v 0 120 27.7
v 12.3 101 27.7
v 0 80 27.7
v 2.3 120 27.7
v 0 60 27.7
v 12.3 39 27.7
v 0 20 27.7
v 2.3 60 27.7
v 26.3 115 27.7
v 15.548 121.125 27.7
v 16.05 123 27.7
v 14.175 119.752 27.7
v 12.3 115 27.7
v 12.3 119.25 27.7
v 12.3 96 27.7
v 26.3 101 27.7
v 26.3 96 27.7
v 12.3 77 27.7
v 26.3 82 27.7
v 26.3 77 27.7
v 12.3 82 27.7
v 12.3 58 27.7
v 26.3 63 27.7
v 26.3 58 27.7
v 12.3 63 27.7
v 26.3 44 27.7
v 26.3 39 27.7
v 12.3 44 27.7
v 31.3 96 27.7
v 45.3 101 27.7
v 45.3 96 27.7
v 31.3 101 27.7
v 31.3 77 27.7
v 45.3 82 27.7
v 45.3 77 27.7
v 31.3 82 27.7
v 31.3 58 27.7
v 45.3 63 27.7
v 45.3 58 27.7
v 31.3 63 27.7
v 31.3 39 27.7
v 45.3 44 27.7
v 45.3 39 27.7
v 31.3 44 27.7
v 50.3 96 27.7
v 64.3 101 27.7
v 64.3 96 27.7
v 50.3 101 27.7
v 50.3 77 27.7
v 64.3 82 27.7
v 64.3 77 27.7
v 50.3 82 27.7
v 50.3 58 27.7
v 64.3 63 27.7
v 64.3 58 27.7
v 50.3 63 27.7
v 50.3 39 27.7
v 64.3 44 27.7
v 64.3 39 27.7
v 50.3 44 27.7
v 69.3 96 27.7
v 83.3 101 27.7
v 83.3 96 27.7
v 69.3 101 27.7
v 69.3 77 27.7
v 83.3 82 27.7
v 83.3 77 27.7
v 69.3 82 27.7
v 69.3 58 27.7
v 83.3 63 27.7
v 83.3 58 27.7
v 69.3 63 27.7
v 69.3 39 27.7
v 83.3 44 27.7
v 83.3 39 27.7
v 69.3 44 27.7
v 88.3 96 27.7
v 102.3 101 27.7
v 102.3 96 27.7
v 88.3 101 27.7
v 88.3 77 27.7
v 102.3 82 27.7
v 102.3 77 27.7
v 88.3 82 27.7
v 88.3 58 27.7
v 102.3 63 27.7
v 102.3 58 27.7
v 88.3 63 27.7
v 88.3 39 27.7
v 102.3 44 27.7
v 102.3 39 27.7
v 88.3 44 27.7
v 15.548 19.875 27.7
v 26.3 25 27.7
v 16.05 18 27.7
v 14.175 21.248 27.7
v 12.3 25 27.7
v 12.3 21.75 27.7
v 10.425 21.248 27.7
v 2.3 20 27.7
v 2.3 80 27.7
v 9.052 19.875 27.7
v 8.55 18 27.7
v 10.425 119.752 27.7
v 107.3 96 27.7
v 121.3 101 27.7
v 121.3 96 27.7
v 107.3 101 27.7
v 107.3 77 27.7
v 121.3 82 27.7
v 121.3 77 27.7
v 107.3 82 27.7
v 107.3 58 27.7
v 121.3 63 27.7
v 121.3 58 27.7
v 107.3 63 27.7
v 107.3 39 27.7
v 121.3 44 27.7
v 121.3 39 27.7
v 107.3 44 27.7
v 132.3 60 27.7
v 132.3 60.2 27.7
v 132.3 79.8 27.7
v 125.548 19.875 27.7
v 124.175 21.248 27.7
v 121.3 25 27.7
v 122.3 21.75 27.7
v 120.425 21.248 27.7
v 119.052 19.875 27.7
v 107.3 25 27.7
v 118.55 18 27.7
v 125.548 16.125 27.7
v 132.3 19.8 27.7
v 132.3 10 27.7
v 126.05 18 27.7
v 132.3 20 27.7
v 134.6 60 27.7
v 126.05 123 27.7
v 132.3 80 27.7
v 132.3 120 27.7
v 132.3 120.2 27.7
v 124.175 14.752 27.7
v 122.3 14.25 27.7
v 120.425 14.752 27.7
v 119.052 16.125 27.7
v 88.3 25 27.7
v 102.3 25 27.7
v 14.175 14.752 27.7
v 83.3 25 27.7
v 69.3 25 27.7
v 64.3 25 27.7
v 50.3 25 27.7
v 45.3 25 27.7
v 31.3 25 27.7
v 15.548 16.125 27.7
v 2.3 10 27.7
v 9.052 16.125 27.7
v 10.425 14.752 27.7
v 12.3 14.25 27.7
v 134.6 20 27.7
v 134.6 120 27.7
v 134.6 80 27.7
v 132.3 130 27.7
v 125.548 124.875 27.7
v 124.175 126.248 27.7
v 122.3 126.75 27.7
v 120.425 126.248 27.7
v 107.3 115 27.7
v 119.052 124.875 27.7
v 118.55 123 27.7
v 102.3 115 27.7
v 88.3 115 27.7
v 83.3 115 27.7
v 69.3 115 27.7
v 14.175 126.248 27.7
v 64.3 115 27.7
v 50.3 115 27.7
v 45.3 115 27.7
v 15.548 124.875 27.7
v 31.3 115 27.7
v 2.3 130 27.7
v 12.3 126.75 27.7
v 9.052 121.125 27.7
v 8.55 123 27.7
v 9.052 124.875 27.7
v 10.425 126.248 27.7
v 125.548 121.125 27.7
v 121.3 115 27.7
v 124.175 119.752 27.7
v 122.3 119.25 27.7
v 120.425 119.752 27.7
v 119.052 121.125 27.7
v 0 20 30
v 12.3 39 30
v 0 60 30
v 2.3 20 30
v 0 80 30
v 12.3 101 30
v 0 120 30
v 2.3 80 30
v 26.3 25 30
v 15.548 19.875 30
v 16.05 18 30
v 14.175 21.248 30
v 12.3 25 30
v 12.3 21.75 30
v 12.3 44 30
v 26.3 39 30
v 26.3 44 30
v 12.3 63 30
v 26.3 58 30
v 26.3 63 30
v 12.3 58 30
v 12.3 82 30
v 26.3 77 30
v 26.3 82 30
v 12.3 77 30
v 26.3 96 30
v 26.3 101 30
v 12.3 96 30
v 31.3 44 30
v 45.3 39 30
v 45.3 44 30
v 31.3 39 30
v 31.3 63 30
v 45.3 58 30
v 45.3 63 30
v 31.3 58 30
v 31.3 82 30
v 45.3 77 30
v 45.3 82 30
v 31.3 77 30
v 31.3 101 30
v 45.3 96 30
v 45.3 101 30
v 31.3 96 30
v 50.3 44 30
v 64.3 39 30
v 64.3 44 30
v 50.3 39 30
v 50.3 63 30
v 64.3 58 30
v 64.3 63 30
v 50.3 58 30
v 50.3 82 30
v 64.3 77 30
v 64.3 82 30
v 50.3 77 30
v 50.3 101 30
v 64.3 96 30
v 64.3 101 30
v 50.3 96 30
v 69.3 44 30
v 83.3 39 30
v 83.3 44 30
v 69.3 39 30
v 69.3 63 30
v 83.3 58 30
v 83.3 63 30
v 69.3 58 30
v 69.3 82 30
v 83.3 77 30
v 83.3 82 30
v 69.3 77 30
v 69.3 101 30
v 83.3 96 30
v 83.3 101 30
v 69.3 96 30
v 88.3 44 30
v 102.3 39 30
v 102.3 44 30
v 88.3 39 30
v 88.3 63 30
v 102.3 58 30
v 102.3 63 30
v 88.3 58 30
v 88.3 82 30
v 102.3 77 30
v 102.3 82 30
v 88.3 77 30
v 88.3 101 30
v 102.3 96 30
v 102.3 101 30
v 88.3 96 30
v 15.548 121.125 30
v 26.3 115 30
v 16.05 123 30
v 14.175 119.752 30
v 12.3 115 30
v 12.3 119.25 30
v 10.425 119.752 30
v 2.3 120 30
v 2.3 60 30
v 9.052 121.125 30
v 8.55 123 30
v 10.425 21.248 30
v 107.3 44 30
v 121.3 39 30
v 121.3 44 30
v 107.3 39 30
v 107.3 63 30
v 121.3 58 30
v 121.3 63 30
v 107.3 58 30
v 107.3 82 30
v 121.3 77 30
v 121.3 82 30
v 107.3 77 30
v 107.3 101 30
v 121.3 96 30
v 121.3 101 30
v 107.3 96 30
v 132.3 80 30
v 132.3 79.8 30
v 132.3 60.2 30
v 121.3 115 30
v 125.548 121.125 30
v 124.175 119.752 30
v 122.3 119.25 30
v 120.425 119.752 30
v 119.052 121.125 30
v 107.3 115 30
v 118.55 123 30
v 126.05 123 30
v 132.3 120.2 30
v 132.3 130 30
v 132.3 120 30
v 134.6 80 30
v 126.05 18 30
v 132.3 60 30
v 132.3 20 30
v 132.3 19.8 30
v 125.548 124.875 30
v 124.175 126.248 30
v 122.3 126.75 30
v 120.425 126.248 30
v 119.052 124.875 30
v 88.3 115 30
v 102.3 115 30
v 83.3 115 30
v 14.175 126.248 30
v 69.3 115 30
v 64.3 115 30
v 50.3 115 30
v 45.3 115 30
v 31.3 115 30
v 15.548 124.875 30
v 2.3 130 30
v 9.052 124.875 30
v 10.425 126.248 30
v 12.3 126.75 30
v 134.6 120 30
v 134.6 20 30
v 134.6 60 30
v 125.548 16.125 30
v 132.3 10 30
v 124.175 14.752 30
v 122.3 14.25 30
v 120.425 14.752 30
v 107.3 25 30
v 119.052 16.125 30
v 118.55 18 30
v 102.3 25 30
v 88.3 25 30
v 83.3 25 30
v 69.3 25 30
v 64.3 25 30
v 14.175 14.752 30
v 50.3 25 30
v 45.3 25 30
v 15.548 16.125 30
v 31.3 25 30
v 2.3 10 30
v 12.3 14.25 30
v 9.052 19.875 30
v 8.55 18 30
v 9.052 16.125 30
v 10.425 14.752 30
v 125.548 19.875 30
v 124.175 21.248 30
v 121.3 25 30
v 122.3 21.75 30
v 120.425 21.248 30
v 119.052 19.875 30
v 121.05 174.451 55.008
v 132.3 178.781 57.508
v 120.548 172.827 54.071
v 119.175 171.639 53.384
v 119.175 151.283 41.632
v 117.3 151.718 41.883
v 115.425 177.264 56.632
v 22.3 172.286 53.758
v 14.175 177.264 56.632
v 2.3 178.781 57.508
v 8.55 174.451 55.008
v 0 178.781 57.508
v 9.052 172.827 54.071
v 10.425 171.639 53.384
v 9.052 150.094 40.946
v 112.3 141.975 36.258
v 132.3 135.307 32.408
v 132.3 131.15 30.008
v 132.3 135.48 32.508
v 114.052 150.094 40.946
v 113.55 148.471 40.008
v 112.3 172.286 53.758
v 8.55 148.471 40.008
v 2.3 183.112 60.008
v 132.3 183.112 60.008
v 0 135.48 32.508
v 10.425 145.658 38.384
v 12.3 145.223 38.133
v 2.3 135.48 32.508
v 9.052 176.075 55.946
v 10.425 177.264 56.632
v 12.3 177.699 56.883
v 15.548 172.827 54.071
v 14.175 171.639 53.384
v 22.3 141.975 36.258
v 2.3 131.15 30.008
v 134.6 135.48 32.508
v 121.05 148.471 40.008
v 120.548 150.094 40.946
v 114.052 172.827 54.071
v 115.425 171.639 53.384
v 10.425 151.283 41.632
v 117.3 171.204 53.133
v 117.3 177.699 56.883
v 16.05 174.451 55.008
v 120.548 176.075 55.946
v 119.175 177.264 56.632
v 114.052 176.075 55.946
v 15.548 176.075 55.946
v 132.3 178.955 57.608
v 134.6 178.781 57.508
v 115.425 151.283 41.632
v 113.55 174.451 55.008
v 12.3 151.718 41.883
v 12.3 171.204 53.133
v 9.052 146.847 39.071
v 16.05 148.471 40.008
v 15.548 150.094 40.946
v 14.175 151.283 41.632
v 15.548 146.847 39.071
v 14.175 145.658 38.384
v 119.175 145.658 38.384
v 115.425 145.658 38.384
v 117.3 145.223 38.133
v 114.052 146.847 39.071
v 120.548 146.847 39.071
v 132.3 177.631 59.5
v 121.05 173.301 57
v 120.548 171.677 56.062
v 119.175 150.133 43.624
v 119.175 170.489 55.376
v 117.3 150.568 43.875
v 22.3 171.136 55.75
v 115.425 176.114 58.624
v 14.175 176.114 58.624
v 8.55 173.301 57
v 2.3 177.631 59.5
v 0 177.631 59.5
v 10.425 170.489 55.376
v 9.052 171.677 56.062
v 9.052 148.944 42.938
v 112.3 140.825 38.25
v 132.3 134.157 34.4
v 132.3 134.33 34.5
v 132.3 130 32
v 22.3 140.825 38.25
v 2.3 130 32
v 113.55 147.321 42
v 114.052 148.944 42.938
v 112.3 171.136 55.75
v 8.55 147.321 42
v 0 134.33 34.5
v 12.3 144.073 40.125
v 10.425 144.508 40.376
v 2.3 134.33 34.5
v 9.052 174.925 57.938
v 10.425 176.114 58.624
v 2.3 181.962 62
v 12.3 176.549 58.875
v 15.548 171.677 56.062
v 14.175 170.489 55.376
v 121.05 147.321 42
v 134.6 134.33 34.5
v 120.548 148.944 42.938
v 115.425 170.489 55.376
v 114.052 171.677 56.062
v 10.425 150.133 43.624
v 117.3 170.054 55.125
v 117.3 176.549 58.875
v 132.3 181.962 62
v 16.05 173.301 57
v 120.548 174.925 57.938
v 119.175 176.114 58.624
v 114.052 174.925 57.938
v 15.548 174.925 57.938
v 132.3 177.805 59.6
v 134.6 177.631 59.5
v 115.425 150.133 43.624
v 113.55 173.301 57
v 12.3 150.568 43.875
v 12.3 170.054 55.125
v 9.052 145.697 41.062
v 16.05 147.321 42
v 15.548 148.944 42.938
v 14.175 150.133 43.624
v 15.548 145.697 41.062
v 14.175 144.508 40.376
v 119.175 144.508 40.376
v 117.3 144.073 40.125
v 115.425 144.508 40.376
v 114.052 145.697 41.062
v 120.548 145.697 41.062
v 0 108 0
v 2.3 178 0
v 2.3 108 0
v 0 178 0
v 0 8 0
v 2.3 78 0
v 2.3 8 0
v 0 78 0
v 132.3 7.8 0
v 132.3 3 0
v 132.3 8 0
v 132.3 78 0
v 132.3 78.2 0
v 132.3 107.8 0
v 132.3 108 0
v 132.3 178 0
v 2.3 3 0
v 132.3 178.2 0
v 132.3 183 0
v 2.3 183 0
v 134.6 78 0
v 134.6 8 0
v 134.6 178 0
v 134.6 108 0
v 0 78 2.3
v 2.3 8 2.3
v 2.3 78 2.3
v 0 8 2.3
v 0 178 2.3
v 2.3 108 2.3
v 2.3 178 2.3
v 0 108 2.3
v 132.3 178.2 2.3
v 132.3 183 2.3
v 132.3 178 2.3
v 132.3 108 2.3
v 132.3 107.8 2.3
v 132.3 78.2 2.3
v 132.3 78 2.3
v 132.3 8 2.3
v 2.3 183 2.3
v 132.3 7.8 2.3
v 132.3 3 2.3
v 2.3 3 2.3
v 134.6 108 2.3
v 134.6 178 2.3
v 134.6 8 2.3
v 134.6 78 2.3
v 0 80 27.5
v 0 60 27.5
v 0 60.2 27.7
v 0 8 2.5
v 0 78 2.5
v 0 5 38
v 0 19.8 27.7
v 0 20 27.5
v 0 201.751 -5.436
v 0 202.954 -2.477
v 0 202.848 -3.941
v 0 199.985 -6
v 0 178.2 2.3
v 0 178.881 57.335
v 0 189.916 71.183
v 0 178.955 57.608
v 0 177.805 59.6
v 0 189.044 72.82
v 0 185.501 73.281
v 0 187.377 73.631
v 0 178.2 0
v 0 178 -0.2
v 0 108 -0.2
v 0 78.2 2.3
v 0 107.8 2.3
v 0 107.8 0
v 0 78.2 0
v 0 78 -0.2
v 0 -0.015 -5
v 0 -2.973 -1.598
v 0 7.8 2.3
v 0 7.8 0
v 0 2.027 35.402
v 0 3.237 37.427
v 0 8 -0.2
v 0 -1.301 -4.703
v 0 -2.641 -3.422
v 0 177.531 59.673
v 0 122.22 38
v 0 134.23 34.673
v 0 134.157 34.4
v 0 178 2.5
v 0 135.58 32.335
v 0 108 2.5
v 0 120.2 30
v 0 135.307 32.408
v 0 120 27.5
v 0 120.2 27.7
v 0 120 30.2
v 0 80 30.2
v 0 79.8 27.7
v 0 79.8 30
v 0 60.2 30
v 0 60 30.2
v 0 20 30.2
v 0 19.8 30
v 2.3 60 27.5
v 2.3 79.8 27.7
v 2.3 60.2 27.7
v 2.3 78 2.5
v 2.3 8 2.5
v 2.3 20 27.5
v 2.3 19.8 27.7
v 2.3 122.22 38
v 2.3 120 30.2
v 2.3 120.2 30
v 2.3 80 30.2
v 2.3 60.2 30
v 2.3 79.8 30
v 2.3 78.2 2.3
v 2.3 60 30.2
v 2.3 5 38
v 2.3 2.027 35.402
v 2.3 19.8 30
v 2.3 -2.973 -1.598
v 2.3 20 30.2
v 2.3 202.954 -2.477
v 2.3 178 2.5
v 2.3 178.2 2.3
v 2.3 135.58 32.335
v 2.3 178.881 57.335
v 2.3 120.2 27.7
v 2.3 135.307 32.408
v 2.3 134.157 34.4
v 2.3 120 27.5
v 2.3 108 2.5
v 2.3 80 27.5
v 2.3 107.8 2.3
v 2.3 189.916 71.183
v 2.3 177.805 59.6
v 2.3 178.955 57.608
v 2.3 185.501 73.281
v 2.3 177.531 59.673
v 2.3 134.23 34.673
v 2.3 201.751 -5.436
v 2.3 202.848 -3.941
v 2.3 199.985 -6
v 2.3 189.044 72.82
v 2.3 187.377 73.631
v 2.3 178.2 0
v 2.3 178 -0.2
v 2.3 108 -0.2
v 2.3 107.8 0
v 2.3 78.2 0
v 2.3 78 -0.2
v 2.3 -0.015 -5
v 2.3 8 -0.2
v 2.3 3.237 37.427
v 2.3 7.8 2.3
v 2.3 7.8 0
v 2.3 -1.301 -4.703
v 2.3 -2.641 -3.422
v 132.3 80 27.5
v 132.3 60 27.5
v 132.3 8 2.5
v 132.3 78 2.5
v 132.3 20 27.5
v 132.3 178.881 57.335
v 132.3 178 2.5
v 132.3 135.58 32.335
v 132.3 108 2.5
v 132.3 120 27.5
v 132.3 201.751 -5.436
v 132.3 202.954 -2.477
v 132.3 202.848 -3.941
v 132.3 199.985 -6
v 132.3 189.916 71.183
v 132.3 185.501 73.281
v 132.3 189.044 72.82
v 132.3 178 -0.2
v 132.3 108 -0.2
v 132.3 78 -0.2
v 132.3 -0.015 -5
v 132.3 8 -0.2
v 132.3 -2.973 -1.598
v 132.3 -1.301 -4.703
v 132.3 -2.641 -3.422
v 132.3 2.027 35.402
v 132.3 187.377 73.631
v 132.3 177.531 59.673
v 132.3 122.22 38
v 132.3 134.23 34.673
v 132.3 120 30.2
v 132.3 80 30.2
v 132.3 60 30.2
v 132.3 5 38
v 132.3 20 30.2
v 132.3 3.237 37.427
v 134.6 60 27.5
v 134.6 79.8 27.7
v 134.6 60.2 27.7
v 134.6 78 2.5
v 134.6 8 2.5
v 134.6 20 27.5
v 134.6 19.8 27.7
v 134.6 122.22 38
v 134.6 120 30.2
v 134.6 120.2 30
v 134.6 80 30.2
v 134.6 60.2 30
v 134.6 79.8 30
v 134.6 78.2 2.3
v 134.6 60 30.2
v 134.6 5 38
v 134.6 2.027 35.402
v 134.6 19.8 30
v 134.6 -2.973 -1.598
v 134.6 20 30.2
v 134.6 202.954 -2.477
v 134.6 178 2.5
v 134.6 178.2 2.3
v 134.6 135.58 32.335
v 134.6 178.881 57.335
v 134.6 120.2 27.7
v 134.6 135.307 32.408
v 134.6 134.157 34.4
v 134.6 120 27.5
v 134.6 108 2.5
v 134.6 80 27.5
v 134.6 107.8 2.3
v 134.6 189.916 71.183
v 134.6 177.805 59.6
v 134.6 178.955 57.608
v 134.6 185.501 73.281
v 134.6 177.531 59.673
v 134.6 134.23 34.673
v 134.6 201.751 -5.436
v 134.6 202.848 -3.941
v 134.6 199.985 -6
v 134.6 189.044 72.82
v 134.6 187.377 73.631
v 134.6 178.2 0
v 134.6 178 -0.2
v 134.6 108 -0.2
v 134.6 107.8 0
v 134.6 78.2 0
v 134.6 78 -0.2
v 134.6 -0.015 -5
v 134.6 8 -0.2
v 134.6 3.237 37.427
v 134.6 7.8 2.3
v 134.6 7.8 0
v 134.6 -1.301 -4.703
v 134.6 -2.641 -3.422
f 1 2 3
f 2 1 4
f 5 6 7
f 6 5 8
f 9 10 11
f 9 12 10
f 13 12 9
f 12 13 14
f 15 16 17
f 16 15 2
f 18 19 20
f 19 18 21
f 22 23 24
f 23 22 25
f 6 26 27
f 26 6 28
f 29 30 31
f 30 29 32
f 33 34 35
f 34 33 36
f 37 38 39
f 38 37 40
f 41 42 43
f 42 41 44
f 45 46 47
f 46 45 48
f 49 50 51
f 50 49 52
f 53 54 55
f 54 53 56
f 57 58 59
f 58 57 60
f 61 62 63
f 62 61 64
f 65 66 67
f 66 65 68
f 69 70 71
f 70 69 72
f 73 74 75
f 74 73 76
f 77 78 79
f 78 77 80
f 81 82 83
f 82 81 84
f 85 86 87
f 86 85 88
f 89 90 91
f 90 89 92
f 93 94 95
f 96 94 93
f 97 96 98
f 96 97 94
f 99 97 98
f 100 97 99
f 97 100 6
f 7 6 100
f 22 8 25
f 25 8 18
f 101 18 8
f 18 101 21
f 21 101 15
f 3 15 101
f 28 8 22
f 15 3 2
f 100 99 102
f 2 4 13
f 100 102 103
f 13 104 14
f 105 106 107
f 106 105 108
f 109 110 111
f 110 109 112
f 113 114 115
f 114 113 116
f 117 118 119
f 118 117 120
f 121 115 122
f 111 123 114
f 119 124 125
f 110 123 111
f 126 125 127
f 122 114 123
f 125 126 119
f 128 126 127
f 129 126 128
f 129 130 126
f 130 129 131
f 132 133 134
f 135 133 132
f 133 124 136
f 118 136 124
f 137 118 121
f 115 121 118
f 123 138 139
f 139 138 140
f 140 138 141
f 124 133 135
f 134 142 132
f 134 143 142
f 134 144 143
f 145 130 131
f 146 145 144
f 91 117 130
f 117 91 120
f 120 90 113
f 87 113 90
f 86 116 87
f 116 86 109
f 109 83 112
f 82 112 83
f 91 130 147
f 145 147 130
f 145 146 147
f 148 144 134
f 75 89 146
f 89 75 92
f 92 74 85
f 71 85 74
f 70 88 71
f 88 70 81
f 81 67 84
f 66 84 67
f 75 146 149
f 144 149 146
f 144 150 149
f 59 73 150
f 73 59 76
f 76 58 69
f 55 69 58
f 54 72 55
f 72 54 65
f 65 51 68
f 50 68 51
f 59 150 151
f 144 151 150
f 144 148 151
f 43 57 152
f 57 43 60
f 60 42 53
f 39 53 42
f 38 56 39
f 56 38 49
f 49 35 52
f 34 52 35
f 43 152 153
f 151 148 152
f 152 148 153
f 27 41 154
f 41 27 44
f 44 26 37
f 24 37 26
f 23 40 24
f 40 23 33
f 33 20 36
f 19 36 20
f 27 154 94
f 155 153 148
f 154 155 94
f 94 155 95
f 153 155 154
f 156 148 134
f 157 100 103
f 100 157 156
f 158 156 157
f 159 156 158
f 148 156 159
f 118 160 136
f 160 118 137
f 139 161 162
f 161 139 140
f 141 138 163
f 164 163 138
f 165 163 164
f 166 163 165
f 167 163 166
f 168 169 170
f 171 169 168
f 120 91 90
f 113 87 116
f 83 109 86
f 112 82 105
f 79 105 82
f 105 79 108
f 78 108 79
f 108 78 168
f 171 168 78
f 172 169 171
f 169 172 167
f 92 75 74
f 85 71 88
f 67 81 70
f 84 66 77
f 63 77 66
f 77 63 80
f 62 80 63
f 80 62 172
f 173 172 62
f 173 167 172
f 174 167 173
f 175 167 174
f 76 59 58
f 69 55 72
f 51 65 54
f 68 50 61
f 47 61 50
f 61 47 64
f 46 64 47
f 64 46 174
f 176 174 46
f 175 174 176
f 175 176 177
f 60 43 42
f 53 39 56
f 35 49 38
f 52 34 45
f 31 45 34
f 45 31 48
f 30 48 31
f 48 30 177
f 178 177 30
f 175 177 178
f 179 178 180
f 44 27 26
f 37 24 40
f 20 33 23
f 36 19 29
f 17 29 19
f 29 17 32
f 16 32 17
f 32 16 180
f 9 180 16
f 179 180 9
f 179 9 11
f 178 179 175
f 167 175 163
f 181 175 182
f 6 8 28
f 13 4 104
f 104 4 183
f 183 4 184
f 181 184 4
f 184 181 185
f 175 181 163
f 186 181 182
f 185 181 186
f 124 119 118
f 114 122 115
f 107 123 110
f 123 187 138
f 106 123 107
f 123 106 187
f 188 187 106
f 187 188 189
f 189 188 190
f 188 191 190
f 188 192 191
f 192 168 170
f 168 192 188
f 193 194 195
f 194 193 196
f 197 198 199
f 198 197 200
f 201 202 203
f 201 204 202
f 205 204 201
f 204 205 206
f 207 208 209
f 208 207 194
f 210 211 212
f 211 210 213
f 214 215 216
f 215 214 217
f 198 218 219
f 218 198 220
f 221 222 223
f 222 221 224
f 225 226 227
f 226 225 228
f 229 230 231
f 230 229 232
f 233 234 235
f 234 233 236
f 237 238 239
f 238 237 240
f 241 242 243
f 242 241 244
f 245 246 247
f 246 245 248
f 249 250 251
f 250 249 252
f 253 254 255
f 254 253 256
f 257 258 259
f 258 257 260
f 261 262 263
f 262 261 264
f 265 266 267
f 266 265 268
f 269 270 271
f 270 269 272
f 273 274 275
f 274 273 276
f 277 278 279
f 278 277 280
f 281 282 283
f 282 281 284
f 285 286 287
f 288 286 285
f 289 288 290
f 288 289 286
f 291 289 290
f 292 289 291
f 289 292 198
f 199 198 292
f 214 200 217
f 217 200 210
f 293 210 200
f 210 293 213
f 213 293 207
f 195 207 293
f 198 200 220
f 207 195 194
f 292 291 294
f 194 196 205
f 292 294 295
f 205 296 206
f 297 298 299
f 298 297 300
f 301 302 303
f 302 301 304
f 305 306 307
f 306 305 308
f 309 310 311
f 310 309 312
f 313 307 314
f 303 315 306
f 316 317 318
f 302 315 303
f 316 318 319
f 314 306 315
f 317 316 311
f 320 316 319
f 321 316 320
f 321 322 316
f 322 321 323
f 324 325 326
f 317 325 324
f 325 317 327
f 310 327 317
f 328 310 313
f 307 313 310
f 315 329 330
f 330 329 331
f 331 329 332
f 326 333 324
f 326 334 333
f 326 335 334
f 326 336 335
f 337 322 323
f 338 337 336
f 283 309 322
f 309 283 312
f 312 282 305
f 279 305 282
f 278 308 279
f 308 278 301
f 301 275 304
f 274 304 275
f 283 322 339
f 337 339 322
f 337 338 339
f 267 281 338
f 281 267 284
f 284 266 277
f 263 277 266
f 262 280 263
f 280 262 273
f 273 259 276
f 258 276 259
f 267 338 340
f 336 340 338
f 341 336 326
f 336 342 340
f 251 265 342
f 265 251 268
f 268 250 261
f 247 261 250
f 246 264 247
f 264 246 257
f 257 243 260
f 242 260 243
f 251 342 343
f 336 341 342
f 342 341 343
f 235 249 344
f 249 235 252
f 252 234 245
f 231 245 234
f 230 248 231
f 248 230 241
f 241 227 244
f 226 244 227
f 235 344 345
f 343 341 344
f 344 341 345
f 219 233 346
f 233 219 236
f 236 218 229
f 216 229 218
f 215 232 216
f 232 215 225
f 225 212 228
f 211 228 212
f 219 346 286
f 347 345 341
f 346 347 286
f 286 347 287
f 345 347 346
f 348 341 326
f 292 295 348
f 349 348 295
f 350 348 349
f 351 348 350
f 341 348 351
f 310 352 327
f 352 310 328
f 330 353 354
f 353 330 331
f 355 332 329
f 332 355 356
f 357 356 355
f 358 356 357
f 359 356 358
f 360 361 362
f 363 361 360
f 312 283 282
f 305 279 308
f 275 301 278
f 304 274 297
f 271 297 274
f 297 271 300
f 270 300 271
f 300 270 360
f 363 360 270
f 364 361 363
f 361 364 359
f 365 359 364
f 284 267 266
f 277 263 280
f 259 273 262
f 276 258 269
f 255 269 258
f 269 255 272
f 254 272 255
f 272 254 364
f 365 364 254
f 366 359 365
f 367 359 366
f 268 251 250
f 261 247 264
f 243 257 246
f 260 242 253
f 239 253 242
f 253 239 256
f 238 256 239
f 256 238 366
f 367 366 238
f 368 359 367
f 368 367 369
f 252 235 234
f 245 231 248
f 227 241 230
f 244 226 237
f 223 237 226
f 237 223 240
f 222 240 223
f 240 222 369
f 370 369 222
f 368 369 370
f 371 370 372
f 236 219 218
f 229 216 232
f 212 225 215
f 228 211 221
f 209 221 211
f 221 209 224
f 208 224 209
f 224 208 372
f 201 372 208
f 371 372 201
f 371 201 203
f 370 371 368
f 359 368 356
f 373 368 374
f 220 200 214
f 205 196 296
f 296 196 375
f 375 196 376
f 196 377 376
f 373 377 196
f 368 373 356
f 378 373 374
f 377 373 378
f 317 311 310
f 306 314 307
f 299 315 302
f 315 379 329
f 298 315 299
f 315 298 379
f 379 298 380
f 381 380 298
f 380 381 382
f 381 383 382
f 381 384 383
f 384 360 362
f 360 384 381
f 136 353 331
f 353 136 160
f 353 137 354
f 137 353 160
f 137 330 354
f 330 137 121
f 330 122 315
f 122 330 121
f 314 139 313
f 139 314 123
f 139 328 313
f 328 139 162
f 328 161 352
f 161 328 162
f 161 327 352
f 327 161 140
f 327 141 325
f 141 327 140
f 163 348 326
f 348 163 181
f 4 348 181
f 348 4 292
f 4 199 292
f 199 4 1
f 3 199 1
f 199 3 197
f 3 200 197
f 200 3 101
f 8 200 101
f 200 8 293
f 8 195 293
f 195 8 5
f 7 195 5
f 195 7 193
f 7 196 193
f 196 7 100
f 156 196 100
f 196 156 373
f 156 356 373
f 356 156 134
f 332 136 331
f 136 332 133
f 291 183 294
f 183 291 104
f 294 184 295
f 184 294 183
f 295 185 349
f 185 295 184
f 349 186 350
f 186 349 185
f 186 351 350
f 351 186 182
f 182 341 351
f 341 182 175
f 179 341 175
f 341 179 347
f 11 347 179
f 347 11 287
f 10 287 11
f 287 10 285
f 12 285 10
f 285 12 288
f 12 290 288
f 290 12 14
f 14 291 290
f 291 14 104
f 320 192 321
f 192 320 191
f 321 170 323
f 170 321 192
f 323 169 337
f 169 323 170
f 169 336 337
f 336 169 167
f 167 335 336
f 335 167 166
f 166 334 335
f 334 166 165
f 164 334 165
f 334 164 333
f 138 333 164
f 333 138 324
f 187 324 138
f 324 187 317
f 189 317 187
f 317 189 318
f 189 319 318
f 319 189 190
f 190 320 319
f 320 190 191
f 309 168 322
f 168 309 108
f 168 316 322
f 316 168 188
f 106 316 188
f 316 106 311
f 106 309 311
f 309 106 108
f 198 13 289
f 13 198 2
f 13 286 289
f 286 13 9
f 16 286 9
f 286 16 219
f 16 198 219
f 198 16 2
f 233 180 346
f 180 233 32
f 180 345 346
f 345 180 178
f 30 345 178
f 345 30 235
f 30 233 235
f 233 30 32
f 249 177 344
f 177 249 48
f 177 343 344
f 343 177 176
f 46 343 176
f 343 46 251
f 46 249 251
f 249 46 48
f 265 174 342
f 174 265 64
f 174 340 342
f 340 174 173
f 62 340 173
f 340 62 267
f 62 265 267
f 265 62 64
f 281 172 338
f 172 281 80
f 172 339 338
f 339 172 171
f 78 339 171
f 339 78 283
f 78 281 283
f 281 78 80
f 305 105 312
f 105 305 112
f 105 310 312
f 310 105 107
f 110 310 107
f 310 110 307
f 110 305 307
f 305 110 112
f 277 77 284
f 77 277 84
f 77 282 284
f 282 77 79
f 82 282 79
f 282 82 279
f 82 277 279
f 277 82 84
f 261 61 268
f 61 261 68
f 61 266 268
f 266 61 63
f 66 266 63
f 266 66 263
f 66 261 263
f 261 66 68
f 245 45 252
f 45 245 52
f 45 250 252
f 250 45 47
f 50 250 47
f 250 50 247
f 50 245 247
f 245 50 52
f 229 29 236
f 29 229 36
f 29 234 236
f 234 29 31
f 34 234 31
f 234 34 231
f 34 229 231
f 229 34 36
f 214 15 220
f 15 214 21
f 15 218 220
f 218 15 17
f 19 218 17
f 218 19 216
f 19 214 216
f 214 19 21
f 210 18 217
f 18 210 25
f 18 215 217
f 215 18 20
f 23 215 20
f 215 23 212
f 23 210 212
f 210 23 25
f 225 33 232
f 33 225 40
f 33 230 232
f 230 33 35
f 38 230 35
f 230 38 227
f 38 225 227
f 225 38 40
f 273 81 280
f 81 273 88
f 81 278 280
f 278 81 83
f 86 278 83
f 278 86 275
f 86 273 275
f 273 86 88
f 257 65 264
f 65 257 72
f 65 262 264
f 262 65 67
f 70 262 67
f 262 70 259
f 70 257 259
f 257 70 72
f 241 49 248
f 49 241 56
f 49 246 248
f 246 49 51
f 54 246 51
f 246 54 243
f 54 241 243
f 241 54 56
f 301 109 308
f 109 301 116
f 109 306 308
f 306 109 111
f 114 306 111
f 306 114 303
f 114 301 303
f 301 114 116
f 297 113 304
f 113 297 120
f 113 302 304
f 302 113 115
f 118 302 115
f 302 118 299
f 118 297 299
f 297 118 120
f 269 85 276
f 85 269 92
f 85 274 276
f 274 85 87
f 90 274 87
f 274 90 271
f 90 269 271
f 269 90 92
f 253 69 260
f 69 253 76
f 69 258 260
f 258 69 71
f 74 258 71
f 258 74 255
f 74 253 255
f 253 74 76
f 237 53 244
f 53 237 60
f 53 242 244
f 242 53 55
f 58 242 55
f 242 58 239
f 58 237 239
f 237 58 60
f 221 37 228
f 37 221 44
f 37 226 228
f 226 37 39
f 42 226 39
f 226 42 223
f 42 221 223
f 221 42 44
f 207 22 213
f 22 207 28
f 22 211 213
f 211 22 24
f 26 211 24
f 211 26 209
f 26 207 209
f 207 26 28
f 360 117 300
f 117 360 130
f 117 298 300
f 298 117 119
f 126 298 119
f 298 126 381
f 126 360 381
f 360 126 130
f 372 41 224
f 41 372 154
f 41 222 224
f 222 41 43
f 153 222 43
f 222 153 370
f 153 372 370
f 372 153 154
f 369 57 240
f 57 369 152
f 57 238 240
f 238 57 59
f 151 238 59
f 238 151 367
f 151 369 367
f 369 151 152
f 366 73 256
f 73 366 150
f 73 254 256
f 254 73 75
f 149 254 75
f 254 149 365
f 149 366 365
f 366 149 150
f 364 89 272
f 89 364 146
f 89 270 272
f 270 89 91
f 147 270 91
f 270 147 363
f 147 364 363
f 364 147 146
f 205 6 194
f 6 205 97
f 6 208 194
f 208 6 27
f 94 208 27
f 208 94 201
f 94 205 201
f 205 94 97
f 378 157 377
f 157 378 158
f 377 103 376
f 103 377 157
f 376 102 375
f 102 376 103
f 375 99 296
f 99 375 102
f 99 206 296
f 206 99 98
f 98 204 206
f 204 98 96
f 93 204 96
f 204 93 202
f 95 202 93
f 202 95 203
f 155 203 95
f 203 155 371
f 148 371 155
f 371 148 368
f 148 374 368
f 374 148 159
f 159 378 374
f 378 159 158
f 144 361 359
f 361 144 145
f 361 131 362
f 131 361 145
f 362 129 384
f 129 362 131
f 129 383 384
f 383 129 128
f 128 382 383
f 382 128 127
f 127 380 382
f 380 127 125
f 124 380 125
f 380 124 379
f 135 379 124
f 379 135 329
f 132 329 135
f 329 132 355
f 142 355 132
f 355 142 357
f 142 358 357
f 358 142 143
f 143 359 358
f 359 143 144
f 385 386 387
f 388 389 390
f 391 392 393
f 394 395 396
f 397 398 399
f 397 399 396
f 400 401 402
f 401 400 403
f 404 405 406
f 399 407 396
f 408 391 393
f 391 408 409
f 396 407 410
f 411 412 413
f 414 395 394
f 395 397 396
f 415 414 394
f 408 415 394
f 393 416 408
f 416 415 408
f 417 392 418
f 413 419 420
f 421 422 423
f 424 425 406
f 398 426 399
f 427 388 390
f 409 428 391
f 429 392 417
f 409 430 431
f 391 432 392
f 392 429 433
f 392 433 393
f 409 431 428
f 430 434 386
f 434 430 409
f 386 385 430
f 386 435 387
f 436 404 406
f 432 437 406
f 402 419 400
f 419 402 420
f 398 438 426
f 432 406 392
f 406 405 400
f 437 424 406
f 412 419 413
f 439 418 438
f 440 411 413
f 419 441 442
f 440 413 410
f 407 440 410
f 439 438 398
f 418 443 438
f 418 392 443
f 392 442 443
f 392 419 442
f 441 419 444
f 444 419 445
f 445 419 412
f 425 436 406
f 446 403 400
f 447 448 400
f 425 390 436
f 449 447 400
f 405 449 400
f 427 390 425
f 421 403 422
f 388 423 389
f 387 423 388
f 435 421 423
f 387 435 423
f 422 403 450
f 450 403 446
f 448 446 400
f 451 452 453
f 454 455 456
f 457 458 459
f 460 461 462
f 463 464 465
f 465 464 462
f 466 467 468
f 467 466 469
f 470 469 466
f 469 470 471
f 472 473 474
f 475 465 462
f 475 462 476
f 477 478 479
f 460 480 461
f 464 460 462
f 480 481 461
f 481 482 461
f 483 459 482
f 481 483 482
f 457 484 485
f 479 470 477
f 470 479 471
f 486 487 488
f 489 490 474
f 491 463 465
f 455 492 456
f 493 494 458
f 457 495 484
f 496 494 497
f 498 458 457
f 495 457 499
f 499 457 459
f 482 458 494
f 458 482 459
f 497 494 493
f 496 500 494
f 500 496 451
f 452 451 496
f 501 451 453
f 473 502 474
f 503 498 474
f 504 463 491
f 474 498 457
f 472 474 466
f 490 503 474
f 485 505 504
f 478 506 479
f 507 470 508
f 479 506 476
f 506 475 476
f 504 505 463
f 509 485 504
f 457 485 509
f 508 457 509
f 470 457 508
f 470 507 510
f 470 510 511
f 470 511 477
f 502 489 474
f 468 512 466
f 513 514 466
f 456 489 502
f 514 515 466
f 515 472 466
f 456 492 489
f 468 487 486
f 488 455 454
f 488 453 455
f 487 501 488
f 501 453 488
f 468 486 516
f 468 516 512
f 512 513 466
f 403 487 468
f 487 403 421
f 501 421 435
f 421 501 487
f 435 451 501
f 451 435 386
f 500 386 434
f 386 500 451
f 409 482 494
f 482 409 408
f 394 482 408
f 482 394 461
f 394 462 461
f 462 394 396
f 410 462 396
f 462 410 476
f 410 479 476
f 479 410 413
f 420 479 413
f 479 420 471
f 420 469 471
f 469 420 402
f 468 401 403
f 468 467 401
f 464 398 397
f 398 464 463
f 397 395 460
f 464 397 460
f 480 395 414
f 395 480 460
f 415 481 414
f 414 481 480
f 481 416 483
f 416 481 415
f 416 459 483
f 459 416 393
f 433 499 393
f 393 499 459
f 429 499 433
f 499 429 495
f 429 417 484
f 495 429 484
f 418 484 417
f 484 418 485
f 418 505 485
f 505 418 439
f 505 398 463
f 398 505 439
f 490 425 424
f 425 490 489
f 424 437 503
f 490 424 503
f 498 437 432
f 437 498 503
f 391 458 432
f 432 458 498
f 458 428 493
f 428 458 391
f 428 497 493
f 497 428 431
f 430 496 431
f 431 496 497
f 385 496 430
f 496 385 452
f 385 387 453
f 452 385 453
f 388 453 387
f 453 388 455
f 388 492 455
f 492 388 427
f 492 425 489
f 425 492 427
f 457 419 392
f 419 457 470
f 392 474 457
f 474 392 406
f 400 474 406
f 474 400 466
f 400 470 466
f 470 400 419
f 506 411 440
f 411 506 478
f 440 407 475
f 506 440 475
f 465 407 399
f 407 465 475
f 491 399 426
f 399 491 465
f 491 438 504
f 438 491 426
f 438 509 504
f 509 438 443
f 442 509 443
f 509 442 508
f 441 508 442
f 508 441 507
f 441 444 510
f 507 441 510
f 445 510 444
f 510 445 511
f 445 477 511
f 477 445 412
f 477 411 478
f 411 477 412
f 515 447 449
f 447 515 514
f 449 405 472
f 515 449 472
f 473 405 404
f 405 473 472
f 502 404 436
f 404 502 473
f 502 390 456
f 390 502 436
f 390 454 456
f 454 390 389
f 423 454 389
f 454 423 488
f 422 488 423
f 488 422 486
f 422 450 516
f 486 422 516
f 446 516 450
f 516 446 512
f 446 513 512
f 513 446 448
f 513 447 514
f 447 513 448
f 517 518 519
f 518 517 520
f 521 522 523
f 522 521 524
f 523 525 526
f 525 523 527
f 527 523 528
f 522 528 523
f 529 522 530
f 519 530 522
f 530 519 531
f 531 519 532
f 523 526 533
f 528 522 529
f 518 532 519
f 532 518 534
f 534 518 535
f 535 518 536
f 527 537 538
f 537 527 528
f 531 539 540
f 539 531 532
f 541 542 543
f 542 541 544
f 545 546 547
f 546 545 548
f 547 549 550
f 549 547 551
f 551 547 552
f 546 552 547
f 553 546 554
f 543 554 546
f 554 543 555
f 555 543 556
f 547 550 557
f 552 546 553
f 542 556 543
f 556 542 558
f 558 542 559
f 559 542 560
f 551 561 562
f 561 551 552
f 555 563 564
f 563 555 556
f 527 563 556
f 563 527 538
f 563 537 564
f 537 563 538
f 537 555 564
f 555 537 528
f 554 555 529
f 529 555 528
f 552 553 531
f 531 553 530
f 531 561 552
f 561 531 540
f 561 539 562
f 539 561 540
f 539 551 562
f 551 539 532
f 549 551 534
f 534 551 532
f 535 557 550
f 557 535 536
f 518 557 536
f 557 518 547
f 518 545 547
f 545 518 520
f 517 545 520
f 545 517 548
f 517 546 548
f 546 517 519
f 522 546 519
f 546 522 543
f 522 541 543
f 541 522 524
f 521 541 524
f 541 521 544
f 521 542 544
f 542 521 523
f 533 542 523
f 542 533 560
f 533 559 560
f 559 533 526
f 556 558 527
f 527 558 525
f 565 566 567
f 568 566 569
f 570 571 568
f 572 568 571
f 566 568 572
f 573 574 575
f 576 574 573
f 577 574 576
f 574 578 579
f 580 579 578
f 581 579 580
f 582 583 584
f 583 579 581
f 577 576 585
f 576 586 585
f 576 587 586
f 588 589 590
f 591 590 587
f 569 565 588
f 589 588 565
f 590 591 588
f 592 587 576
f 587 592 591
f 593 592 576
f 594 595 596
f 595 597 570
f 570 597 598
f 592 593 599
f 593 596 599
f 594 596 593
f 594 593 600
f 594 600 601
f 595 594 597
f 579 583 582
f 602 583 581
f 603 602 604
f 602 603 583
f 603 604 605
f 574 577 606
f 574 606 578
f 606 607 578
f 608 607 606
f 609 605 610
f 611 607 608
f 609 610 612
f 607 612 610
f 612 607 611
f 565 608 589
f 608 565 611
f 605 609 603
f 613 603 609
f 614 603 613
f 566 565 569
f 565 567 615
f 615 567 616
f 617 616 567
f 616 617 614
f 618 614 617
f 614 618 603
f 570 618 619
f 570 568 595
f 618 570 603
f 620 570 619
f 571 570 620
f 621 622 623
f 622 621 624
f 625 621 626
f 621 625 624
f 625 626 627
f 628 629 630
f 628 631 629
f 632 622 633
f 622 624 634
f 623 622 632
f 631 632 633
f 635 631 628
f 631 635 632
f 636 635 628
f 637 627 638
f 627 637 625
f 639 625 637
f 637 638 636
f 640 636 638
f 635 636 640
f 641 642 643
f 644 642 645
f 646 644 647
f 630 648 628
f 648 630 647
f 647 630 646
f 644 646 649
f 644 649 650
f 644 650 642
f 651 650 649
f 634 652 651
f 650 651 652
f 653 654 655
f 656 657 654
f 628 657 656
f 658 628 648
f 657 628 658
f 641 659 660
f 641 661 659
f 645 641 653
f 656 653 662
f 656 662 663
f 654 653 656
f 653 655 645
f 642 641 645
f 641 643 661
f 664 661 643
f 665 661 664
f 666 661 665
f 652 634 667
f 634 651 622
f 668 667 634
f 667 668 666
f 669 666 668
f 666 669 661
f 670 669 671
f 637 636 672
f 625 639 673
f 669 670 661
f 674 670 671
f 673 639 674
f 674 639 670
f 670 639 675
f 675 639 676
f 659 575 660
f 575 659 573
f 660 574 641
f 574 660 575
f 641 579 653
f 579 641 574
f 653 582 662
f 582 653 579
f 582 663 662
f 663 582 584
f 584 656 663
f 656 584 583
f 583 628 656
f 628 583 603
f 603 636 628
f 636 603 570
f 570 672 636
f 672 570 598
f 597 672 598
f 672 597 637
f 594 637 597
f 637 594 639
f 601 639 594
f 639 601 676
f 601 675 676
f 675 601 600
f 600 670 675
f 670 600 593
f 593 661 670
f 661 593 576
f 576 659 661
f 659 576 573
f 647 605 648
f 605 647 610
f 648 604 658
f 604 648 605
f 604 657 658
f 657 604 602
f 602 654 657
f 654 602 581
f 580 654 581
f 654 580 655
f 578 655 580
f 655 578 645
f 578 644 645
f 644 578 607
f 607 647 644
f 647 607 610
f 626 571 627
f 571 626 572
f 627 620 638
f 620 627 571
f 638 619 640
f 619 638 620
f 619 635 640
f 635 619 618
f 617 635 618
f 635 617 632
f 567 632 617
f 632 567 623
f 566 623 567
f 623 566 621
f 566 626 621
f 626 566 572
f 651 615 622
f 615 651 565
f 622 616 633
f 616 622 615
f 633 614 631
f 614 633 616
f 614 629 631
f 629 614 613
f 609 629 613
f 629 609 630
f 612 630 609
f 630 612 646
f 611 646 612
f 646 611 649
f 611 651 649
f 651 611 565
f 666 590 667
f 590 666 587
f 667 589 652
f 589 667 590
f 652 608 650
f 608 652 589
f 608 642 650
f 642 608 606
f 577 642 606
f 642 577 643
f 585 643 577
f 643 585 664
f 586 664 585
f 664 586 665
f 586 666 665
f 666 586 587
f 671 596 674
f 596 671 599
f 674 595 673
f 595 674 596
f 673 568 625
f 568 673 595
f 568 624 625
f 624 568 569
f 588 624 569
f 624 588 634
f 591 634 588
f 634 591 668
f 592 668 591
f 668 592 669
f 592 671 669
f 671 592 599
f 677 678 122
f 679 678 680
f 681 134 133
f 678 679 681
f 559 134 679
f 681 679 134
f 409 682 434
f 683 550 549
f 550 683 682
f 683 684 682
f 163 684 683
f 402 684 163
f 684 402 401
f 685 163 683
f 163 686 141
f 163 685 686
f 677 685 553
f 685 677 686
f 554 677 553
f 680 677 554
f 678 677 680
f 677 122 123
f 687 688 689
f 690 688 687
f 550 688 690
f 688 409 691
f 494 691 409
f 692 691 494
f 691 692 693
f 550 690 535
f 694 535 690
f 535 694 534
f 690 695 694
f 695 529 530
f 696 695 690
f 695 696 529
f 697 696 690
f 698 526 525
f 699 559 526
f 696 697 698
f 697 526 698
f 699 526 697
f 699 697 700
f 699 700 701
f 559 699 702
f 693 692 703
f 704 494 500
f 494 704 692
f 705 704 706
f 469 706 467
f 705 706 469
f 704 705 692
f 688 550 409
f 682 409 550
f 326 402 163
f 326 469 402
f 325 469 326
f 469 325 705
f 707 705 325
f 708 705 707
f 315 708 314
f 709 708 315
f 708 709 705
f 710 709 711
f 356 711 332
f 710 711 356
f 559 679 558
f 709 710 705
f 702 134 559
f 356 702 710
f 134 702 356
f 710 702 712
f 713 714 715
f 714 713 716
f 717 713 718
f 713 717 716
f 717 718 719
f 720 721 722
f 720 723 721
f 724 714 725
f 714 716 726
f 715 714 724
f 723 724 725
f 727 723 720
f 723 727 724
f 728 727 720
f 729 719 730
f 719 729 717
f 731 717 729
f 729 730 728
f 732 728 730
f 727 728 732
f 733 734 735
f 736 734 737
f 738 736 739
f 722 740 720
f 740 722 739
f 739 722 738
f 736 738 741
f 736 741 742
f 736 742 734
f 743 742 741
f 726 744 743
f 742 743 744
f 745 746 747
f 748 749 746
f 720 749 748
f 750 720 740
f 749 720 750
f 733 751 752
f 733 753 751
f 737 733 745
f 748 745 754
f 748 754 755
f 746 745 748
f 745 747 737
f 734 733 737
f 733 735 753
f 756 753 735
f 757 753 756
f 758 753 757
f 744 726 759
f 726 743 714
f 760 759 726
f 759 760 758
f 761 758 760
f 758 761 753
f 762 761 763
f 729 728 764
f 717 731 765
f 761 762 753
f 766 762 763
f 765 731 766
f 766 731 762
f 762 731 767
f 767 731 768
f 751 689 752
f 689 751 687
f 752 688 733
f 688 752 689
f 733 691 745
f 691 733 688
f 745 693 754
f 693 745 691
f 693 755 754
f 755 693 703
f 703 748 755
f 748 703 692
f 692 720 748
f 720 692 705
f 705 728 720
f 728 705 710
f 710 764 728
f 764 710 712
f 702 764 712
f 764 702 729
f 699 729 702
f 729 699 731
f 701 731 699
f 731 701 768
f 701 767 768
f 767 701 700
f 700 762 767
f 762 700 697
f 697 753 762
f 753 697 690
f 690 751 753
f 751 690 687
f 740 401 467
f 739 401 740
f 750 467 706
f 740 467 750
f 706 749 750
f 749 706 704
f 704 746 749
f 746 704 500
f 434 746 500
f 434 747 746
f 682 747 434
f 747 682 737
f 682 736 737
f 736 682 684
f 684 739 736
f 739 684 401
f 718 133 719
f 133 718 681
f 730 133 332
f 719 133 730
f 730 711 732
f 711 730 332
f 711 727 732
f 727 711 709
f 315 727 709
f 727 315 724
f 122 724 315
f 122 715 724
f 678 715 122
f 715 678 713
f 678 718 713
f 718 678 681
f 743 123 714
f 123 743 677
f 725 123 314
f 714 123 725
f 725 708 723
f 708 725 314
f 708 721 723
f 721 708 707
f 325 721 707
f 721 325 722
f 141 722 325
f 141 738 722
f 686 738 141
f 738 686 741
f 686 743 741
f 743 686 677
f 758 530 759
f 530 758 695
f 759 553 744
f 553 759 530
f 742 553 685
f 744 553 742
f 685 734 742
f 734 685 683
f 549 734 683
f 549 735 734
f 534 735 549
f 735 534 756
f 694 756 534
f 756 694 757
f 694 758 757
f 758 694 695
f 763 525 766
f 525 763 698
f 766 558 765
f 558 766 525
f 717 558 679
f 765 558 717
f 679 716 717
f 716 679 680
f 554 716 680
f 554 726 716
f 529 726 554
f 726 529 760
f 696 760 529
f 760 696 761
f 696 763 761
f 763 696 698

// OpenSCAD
overall_dimensions = [130, 200, 60];
stock_thickness = 2.3;
hole_diameter = 3.75;

front_inset = 10;
back_inset = 10;
base_inset = 3;

keypad_plate_height = 30;
display_plate_height = 32;
display_back_distance = 130;

side_allowance = 5;

tab_length = 40;
tab_depth = stock_thickness;
tab_tolerance = .2;

keypad_width = 130;
keypad_height = 115;

display_height = 60;
display_angle = 30;
display_dimensions = [90,35];

function display_top_coords() = [0,display_back_distance + cos(display_angle) * display_height,display_plate_height + sin(display_angle) * display_height];

module mounting_holes_2d(rows, columns, spacing) {
    for(row=[0:rows-1], col=[0:columns-1]) {
        translate([col * spacing.x, row * spacing.y])
            circle(hole_diameter);
    }
}

module tab2d(plate_width, length) {
    translate([plate_width/2,0])square([plate_width+2*tab_depth, length],center=true);
}

module keypad_plate() {
    key_rows = 5;
    key_cols = 6;

    key_width = 14;
    key_height = key_width;

    mounting_hole_spacing = [110, 105];

    module plate_frame(size) {
        square([size.x,size.y]);
        // two tabs on each side
        translate([size.x/2,90])square([size.x + 2*tab_depth, tab_length],center=true);
        translate([size.x/2,30])square([size.x + 2*tab_depth, tab_length],center=true);
    }

    module key_array(rows, columns, spacing) {
        for(row=[0:rows-1], col=[0:columns-1]) {
            translate([col * (key_width + spacing), row * (key_width + spacing),0])
                square([key_width, key_height]);
        }
    }

    difference() {
        plate_frame([keypad_width,120]);
        translate([10,15])key_array(key_rows,key_cols,5);
        translate([10,8])mounting_holes_2d(2, 2, mounting_hole_spacing);
    }
}

module display_plate(size) {
    module display_frame(size) {
        square(size);
        translate([0,size.y/2])tab2d(size.x, size.y - 10);
    }

    difference() {
        display_frame([size.x,size.y]);
        translate([size.x/2,size.y/2])square(display_dimensions, center=true);
        translate([10, 20])mounting_holes_2d(2, 2, [105, 30]);
    }
    
}

module base_plate(size) {
    square(size);
    translate([0,40,0])tab2d(size.x, size.y/2 - 20);
    translate([0,140,0])tab2d(size.x, size.y/2 - 20);
}
 
module mounting_plates() {
    translate([tab_depth,0,0]){
        color("BurlyWood"){
            // Keypad Plate
            translate([0, front_inset, keypad_plate_height - stock_thickness])
                linear_extrude(stock_thickness)
                keypad_plate();
            
            // Display Plate
            translate([0,display_back_distance,display_plate_height])
                rotate([display_angle,0,0])
                translate([0,0,-stock_thickness])
                linear_extrude(stock_thickness)
                display_plate([keypad_width, display_height]);
        }
        
        color("DimGray")
            // Base Plate
            translate([0, base_inset, 0])
            linear_extrude(stock_thickness)
            base_plate([keypad_width, overall_dimensions.y - front_inset - back_inset]);
    }
}

module side_panel() {
    module slots2d() {
        offset(tab_tolerance)projection()intersection() {
            translate([0,0,-(overall_dimensions.x + tab_depth + 1)])rotate([0,0,-90])rotate([0,-90,0])mounting_plates();
            cube([overall_dimensions.y, overall_dimensions.z, 2]);
        }
    }
    
    module side_polygon() {
        d2 = display_plate_height - (keypad_plate_height + side_allowance);
        d3 = side_allowance/cos(display_angle);
        x = d2+d3/tan(display_angle);
        hard_point_1 = [display_back_distance - x, keypad_plate_height + side_allowance];
        
        d4 = side_allowance / sin(display_angle);
        d5 = (side_allowance + d4) * tan(display_angle);
        y = display_top_coords().z + d5;
        hard_point_2 = [display_top_coords().y + side_allowance, y];

        offset(3)polygon([
        [0,base_inset - side_allowance],
        [front_inset - side_allowance,keypad_plate_height + side_allowance],
        hard_point_1,
        hard_point_2, 
        [overall_dimensions.y,-base_inset]
        ]);
    }
    rotate([0,90,0])rotate([0,0,90])
    linear_extrude(stock_thickness)difference() {
        side_polygon();
        slots2d();
    }
}
color("Sienna"){
    side_panel();
    translate([keypad_width+tab_depth,0,0])side_panel();
}
mounting_plates();
